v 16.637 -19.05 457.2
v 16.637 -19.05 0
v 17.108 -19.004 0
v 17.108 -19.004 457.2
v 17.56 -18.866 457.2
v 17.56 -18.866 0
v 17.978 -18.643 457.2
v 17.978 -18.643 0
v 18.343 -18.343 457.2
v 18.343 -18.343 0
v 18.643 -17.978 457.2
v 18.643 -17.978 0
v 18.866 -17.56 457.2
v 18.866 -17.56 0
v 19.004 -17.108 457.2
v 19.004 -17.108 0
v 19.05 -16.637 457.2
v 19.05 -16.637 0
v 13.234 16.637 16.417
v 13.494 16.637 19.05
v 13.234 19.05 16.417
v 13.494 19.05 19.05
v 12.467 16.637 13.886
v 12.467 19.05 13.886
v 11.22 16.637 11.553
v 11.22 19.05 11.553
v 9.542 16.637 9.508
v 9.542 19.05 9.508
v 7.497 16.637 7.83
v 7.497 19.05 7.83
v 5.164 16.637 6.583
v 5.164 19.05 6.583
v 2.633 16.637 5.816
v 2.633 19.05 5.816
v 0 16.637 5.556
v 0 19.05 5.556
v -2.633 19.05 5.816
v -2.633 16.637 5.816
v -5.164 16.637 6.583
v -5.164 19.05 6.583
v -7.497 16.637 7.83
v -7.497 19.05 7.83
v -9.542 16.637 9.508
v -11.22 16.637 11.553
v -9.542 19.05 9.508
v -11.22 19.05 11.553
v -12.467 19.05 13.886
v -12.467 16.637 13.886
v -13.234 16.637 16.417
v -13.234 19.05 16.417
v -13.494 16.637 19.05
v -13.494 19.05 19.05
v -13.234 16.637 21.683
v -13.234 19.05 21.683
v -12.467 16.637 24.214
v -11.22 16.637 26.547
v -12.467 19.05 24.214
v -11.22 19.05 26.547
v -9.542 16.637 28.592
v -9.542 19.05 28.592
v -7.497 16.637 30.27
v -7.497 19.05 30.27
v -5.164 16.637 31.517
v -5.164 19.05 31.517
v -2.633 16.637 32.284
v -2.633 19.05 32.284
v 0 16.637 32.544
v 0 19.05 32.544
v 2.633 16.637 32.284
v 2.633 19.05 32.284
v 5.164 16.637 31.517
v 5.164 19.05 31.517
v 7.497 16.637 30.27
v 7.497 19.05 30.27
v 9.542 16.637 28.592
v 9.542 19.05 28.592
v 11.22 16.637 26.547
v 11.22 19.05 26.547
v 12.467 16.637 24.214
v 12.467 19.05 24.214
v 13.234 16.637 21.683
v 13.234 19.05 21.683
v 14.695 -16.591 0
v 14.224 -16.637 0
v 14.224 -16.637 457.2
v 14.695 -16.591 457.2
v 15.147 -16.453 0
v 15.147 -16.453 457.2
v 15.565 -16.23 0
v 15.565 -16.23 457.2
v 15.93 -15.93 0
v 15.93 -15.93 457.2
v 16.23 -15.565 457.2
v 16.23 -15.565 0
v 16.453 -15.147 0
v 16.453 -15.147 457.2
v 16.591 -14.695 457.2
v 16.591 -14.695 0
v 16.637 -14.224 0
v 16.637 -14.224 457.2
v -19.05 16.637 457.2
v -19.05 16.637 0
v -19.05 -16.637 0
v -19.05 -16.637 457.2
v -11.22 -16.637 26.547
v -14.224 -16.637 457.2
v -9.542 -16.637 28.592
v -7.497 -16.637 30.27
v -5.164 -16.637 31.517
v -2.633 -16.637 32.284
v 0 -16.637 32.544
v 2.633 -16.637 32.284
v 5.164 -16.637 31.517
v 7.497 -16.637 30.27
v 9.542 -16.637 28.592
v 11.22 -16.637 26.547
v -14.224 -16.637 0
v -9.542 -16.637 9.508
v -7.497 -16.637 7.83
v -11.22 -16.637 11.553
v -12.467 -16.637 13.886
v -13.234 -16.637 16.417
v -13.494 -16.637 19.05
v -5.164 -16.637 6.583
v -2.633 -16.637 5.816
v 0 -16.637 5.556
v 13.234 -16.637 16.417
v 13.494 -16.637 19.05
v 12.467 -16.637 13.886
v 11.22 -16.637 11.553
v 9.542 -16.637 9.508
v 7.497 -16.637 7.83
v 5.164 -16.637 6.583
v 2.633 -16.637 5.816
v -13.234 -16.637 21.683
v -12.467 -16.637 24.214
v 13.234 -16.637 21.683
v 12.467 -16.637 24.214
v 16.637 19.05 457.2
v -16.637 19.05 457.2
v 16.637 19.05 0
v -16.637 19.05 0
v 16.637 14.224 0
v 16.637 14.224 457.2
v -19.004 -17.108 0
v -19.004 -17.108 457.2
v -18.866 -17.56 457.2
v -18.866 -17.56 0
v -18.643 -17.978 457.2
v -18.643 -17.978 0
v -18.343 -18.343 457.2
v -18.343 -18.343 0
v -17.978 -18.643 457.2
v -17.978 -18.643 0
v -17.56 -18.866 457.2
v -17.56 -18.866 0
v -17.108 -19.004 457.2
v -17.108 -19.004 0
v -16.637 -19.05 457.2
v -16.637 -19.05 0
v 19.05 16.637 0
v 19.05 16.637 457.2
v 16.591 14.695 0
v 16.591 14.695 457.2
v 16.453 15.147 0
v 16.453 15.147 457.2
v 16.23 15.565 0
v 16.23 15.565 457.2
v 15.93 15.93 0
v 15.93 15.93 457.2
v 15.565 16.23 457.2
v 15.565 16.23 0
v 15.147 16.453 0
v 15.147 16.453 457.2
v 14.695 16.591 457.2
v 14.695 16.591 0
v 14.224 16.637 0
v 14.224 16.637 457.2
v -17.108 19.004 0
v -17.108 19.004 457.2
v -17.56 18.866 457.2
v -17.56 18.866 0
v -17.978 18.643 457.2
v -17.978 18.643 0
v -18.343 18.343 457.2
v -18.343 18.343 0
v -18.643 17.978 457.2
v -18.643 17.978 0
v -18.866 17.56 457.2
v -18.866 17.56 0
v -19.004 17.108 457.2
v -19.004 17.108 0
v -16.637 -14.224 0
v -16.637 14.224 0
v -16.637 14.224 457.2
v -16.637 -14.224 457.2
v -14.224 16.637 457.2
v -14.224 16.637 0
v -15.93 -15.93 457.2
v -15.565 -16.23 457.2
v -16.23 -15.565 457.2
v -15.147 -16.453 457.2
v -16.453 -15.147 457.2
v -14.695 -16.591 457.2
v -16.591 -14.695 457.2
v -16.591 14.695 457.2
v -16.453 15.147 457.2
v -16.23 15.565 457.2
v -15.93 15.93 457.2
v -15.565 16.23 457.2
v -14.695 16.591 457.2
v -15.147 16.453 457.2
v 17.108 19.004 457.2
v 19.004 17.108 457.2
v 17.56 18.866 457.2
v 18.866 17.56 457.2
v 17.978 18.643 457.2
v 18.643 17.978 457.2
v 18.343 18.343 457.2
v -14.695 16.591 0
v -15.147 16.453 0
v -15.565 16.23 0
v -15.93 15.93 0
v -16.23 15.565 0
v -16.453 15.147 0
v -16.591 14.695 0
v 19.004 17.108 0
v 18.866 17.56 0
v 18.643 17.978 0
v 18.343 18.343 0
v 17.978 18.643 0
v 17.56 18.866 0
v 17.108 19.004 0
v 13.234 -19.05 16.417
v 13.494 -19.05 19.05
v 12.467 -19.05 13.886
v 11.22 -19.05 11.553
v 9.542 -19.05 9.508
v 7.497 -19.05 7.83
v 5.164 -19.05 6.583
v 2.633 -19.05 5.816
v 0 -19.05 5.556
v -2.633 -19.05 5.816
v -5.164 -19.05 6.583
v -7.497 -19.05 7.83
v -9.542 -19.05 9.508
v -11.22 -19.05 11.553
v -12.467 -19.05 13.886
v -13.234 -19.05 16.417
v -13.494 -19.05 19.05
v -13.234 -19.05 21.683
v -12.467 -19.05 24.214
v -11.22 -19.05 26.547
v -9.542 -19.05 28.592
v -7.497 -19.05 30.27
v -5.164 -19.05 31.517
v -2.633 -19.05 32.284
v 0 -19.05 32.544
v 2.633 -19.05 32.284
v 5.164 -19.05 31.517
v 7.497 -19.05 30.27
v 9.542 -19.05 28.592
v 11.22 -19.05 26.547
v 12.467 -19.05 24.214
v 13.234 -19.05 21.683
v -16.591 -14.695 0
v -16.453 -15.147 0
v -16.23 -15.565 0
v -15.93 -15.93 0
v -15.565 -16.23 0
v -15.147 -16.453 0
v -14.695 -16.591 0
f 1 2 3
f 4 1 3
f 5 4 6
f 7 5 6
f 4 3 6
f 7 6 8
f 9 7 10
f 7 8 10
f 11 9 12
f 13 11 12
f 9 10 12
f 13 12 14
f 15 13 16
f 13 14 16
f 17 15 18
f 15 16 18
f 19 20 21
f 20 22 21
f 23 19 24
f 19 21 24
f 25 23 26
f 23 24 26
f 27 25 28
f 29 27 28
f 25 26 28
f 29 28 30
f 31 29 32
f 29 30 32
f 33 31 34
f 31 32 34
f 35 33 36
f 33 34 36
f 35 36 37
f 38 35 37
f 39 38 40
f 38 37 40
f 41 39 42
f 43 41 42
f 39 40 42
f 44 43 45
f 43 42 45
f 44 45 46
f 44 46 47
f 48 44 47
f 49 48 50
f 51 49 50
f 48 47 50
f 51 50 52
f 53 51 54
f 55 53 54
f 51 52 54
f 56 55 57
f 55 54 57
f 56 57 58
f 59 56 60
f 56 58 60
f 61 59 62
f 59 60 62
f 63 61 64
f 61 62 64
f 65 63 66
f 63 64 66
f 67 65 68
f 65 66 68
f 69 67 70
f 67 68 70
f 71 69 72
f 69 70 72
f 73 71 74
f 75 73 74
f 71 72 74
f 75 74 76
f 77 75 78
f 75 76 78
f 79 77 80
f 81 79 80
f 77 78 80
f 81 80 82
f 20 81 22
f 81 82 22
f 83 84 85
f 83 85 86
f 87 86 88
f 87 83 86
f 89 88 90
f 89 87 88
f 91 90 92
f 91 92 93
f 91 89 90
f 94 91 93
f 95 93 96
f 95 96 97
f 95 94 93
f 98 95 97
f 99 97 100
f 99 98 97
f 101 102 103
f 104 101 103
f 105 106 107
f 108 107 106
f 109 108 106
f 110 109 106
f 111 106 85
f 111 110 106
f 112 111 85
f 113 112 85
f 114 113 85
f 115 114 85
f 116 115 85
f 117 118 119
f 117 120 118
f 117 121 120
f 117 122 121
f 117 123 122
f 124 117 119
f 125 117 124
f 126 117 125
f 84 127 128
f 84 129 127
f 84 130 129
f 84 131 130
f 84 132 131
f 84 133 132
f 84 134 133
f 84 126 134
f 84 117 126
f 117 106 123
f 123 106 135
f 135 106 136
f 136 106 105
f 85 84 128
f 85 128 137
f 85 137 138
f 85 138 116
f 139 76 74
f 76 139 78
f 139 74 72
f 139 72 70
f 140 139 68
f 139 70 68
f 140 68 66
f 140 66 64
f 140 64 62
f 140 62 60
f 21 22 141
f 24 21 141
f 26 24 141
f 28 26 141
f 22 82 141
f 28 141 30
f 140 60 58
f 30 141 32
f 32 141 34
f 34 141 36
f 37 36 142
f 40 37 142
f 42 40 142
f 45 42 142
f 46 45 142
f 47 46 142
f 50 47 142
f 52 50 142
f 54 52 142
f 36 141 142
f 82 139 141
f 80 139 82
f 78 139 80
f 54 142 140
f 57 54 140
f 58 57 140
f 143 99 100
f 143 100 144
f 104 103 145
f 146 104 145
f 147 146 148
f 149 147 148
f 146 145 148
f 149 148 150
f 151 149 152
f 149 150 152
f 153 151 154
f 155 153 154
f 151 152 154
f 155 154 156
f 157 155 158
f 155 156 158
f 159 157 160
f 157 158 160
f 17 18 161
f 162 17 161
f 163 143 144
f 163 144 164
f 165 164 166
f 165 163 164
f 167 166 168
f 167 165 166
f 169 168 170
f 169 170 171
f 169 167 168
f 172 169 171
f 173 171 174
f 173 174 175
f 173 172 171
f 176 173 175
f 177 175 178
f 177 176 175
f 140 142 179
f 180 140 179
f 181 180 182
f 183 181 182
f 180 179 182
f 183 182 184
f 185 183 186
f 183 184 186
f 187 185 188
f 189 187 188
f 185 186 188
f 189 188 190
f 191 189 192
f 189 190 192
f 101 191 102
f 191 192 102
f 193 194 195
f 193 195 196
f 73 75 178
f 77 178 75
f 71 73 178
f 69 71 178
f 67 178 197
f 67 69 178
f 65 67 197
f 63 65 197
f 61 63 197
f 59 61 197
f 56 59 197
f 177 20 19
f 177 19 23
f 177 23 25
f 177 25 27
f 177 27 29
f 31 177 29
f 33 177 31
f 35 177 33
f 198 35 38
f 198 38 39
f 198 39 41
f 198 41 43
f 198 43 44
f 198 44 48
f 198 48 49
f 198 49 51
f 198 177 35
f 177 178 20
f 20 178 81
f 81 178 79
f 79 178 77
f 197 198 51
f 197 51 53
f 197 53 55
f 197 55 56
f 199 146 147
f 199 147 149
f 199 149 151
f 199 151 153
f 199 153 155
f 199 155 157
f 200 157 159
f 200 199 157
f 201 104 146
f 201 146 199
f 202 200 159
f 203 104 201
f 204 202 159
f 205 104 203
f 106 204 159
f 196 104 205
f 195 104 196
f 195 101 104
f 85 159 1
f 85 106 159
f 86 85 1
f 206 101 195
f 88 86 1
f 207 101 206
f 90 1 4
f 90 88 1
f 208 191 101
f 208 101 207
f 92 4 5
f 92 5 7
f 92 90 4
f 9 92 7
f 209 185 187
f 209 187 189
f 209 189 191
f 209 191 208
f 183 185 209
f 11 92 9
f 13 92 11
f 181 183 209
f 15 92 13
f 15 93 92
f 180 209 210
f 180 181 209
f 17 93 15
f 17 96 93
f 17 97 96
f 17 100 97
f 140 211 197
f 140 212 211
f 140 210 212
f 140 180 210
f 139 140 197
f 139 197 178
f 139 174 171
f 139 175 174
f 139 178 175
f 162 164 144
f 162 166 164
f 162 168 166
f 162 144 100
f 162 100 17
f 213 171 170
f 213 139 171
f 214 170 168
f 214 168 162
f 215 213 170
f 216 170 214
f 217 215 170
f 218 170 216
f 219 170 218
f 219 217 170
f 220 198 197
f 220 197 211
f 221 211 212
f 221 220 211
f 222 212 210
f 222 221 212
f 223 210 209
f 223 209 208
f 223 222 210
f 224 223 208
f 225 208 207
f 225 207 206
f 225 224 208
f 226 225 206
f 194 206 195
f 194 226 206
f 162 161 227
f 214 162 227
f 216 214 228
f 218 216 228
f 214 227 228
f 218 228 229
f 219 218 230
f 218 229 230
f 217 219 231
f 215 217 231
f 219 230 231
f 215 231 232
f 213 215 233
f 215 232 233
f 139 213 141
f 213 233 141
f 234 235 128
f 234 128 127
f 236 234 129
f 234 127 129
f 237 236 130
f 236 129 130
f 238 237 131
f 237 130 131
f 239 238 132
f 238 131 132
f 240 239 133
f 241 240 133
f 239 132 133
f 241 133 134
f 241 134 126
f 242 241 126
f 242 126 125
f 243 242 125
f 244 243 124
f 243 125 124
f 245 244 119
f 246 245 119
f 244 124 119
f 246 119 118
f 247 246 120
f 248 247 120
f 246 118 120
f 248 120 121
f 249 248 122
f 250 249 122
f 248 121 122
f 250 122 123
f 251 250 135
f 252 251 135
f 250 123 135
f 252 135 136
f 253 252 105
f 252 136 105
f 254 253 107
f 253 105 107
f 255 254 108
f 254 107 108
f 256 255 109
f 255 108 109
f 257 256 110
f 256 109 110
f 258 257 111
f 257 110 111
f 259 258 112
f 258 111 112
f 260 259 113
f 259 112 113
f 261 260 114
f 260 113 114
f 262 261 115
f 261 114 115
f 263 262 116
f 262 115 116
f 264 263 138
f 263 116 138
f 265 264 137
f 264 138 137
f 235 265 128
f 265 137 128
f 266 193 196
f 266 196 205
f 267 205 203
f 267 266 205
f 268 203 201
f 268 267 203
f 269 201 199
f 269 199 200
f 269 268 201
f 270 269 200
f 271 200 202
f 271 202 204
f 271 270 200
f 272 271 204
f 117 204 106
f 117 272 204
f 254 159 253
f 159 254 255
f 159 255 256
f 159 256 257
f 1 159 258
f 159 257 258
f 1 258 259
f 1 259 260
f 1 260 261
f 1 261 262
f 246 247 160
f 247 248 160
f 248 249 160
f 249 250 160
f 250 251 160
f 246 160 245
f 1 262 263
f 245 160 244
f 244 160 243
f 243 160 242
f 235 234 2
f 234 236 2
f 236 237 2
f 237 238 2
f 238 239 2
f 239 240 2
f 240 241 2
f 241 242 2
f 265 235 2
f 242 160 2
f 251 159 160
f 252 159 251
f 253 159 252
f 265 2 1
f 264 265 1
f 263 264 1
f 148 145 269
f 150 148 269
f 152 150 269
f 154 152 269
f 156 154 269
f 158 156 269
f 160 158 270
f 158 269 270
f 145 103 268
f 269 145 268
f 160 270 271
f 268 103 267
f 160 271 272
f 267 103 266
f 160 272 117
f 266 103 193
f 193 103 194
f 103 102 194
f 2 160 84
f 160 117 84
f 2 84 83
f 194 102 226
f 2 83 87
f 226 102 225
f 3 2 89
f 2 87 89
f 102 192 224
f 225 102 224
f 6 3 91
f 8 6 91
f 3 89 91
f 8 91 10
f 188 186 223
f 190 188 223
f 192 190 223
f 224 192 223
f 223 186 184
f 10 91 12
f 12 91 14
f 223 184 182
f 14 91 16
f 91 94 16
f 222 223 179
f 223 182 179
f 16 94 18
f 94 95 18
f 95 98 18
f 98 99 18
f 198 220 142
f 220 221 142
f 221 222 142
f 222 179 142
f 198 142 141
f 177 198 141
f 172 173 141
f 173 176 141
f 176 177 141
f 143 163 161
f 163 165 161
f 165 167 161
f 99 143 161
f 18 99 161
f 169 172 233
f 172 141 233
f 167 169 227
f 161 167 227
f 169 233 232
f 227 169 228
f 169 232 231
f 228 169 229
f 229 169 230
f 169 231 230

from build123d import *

# Parameters (mm, degrees)
BOSS_EXTRUDE1_DEPTH = 457.2
SKETCH2_R           = 13.49375
CUT_EXTRUDE1_DEPTH  = 228.6


with BuildPart() as part:
    # Sketch1 → Boss-Extrude1 (new body)
    with BuildSketch(Plane.XY):
        with BuildLine():
            Line((-16.637, -19.05), (16.637, -19.05))
            ThreePointArc((16.637, -19.05), (18.343248663, -18.343248663), (19.05, -16.637))
            Line((19.05, -16.637), (19.05, 16.637))
            ThreePointArc((19.05, 16.637), (18.343248663, 18.343248663), (16.637, 19.05))
            Line((16.637, 19.05), (-16.637, 19.05))
            ThreePointArc((-16.637, 19.05), (-18.343248663, 18.343248663), (-19.05, 16.637))
            Line((-19.05, 16.637), (-19.05, -16.637))
            ThreePointArc((-19.05, -16.637), (-18.343248663, -18.343248663), (-16.637, -19.05))
        make_face()
        with BuildLine():
            Line((-14.224, -16.637), (14.224, -16.637))
            ThreePointArc((14.224, -16.637), (15.930248663, -15.930248663), (16.637, -14.224))
            Line((16.637, -14.224), (16.637, 14.224))
            ThreePointArc((16.637, 14.224), (15.930248663, 15.930248663), (14.224, 16.637))
            Line((14.224, 16.637), (-14.224, 16.637))
            ThreePointArc((-14.224, 16.637), (-15.930248663, 15.930248663), (-16.637, 14.224))
            Line((-16.637, 14.224), (-16.637, -14.224))
            ThreePointArc((-16.637, -14.224), (-15.930248663, -15.930248663), (-14.224, -16.637))
        make_face(mode=Mode.SUBTRACT)
    extrude(amount=BOSS_EXTRUDE1_DEPTH)

    # Sketch2 → Cut-Extrude1 (cut, symmetric)
    with BuildSketch(Plane(origin=(0, 0, 0), x_dir=(1, 0, 0), z_dir=(0, 1, 0))):
        with Locations((0, -19.05)):
            Circle(SKETCH2_R)
    extrude(amount=CUT_EXTRUDE1_DEPTH, both=True, mode=Mode.SUBTRACT)


solid = part.part
